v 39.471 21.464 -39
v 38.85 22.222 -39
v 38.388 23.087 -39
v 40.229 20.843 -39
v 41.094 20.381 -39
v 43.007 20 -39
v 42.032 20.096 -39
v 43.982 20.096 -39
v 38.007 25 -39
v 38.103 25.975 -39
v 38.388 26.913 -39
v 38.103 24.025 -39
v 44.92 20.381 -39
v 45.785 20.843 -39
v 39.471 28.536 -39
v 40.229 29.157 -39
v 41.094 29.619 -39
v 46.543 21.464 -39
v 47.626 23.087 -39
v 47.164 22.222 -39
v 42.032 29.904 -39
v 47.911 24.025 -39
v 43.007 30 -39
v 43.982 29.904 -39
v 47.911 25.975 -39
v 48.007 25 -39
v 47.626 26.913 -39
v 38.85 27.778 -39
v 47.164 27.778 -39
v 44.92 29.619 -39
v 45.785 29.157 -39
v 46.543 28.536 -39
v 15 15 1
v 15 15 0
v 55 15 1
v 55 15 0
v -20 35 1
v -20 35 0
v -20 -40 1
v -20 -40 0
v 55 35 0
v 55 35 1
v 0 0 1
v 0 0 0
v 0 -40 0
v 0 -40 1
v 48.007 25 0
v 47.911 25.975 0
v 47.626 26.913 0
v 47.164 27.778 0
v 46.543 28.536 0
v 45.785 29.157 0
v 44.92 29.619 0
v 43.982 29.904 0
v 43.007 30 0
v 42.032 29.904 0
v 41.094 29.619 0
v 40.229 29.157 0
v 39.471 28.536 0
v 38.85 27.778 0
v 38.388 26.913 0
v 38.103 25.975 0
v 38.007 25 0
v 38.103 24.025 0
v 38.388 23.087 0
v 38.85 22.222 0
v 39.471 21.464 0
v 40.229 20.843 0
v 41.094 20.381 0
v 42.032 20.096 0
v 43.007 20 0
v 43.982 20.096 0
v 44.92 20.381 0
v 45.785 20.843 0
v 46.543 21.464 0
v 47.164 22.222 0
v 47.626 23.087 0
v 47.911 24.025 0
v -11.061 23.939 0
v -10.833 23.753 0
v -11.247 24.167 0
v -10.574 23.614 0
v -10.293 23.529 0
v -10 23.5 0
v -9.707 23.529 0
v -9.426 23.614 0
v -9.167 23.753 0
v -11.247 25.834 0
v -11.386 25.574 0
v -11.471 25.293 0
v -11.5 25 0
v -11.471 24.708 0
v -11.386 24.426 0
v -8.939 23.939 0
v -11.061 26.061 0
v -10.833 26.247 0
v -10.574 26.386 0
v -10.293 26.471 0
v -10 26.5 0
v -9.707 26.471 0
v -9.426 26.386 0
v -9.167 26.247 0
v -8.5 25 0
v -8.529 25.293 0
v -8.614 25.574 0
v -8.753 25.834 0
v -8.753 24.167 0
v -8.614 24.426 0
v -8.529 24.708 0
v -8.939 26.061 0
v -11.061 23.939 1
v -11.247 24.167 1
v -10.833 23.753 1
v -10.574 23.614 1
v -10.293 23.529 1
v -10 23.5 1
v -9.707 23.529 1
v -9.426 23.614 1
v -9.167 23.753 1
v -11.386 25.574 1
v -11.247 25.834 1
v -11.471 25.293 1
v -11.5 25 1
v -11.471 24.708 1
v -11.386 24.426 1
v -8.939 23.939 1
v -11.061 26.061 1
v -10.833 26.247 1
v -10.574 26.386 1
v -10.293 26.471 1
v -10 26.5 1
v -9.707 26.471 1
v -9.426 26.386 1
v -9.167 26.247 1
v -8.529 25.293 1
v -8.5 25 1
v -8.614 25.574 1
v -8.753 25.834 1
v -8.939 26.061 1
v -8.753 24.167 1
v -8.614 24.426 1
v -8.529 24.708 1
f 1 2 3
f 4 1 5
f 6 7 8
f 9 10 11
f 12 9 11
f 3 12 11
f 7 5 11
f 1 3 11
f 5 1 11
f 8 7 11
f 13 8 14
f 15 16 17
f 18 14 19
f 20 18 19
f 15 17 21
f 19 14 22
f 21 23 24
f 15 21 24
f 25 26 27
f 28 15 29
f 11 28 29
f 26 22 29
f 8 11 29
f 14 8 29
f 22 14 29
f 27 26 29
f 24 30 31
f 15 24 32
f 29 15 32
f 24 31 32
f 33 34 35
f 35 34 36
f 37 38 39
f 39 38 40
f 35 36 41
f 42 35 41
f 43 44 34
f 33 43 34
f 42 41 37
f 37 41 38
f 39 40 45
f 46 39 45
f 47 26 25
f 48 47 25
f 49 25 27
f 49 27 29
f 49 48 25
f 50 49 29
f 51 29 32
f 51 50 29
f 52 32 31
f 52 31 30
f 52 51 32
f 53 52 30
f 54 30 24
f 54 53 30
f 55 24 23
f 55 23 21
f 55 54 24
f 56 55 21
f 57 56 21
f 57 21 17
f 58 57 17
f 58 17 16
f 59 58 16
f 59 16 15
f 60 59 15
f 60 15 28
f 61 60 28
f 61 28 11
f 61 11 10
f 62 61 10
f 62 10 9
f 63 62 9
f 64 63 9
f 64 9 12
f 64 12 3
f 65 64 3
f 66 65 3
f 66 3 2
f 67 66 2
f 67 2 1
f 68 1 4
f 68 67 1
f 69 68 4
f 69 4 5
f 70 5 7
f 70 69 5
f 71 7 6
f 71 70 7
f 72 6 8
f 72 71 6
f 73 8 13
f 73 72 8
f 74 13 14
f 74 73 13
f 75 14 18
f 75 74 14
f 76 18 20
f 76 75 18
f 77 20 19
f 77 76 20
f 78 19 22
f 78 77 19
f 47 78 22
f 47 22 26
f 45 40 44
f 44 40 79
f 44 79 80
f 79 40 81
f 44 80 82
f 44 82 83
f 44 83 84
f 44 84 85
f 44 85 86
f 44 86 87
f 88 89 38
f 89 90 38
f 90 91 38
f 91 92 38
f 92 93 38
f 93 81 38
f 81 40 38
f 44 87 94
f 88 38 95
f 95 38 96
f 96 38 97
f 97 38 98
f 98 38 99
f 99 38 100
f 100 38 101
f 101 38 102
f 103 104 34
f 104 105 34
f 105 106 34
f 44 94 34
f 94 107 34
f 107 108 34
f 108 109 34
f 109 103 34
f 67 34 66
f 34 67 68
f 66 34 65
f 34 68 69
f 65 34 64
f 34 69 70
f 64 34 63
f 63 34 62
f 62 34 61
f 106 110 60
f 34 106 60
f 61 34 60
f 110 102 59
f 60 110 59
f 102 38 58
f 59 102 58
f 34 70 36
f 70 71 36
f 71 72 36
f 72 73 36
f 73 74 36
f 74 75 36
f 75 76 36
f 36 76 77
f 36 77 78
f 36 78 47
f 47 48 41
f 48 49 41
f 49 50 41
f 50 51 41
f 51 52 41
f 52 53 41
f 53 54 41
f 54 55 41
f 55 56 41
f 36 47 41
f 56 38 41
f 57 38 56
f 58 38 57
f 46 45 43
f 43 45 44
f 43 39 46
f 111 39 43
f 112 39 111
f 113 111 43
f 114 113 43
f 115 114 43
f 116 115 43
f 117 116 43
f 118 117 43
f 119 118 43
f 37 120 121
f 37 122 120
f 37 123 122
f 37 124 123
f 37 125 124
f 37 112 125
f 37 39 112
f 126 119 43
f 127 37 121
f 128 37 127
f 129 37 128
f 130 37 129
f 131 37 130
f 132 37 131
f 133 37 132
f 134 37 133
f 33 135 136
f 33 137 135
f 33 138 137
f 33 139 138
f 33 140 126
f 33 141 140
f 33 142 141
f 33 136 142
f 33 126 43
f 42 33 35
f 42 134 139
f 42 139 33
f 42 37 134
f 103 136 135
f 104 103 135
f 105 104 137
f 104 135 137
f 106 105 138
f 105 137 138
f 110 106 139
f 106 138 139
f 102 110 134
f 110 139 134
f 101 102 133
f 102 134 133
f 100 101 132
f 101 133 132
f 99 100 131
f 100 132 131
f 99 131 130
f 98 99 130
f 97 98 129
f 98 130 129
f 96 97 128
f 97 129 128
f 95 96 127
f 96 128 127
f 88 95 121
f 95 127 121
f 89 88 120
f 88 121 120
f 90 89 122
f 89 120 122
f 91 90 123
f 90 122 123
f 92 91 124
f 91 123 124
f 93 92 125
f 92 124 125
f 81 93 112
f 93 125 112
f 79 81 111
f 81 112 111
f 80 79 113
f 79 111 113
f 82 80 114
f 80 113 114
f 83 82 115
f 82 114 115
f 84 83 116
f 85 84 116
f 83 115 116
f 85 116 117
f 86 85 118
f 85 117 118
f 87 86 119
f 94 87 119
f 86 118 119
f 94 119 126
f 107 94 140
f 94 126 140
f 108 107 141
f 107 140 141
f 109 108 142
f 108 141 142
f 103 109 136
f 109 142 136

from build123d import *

# Parameters (mm, degrees)
BOSS_EXTRUDE1_DEPTH = 1
SKETCH4_R           = 1.5
CUT_EXTRUDE5_DEPTH  = 1
SKETCH5_R           = 5
BOSS_EXTRUDE2_DEPTH = 40


with BuildPart() as part:
    # Sketch1 → Boss-Extrude1 (new body)
    with BuildSketch(Plane.XY):
        Polygon((-20, 35), (-20, -40), (0, -40), (0, 0), (15, 15), (55, 15), (55, 35), align=None)
    extrude(amount=BOSS_EXTRUDE1_DEPTH)

    # Sketch4 → Cut-Extrude5 (cut)
    with BuildSketch(Plane.XY.offset(1)):
        with Locations((-10, 25.000149563)):
            Circle(SKETCH4_R)
    extrude(amount=-CUT_EXTRUDE5_DEPTH, mode=Mode.SUBTRACT)

    # Sketch5 → Boss-Extrude2 (add)
    with BuildSketch(Plane.XY.offset(1)):
        with Locations((43.007008147, 25)):
            Circle(SKETCH5_R)
    extrude(amount=-BOSS_EXTRUDE2_DEPTH)


solid = part.part
